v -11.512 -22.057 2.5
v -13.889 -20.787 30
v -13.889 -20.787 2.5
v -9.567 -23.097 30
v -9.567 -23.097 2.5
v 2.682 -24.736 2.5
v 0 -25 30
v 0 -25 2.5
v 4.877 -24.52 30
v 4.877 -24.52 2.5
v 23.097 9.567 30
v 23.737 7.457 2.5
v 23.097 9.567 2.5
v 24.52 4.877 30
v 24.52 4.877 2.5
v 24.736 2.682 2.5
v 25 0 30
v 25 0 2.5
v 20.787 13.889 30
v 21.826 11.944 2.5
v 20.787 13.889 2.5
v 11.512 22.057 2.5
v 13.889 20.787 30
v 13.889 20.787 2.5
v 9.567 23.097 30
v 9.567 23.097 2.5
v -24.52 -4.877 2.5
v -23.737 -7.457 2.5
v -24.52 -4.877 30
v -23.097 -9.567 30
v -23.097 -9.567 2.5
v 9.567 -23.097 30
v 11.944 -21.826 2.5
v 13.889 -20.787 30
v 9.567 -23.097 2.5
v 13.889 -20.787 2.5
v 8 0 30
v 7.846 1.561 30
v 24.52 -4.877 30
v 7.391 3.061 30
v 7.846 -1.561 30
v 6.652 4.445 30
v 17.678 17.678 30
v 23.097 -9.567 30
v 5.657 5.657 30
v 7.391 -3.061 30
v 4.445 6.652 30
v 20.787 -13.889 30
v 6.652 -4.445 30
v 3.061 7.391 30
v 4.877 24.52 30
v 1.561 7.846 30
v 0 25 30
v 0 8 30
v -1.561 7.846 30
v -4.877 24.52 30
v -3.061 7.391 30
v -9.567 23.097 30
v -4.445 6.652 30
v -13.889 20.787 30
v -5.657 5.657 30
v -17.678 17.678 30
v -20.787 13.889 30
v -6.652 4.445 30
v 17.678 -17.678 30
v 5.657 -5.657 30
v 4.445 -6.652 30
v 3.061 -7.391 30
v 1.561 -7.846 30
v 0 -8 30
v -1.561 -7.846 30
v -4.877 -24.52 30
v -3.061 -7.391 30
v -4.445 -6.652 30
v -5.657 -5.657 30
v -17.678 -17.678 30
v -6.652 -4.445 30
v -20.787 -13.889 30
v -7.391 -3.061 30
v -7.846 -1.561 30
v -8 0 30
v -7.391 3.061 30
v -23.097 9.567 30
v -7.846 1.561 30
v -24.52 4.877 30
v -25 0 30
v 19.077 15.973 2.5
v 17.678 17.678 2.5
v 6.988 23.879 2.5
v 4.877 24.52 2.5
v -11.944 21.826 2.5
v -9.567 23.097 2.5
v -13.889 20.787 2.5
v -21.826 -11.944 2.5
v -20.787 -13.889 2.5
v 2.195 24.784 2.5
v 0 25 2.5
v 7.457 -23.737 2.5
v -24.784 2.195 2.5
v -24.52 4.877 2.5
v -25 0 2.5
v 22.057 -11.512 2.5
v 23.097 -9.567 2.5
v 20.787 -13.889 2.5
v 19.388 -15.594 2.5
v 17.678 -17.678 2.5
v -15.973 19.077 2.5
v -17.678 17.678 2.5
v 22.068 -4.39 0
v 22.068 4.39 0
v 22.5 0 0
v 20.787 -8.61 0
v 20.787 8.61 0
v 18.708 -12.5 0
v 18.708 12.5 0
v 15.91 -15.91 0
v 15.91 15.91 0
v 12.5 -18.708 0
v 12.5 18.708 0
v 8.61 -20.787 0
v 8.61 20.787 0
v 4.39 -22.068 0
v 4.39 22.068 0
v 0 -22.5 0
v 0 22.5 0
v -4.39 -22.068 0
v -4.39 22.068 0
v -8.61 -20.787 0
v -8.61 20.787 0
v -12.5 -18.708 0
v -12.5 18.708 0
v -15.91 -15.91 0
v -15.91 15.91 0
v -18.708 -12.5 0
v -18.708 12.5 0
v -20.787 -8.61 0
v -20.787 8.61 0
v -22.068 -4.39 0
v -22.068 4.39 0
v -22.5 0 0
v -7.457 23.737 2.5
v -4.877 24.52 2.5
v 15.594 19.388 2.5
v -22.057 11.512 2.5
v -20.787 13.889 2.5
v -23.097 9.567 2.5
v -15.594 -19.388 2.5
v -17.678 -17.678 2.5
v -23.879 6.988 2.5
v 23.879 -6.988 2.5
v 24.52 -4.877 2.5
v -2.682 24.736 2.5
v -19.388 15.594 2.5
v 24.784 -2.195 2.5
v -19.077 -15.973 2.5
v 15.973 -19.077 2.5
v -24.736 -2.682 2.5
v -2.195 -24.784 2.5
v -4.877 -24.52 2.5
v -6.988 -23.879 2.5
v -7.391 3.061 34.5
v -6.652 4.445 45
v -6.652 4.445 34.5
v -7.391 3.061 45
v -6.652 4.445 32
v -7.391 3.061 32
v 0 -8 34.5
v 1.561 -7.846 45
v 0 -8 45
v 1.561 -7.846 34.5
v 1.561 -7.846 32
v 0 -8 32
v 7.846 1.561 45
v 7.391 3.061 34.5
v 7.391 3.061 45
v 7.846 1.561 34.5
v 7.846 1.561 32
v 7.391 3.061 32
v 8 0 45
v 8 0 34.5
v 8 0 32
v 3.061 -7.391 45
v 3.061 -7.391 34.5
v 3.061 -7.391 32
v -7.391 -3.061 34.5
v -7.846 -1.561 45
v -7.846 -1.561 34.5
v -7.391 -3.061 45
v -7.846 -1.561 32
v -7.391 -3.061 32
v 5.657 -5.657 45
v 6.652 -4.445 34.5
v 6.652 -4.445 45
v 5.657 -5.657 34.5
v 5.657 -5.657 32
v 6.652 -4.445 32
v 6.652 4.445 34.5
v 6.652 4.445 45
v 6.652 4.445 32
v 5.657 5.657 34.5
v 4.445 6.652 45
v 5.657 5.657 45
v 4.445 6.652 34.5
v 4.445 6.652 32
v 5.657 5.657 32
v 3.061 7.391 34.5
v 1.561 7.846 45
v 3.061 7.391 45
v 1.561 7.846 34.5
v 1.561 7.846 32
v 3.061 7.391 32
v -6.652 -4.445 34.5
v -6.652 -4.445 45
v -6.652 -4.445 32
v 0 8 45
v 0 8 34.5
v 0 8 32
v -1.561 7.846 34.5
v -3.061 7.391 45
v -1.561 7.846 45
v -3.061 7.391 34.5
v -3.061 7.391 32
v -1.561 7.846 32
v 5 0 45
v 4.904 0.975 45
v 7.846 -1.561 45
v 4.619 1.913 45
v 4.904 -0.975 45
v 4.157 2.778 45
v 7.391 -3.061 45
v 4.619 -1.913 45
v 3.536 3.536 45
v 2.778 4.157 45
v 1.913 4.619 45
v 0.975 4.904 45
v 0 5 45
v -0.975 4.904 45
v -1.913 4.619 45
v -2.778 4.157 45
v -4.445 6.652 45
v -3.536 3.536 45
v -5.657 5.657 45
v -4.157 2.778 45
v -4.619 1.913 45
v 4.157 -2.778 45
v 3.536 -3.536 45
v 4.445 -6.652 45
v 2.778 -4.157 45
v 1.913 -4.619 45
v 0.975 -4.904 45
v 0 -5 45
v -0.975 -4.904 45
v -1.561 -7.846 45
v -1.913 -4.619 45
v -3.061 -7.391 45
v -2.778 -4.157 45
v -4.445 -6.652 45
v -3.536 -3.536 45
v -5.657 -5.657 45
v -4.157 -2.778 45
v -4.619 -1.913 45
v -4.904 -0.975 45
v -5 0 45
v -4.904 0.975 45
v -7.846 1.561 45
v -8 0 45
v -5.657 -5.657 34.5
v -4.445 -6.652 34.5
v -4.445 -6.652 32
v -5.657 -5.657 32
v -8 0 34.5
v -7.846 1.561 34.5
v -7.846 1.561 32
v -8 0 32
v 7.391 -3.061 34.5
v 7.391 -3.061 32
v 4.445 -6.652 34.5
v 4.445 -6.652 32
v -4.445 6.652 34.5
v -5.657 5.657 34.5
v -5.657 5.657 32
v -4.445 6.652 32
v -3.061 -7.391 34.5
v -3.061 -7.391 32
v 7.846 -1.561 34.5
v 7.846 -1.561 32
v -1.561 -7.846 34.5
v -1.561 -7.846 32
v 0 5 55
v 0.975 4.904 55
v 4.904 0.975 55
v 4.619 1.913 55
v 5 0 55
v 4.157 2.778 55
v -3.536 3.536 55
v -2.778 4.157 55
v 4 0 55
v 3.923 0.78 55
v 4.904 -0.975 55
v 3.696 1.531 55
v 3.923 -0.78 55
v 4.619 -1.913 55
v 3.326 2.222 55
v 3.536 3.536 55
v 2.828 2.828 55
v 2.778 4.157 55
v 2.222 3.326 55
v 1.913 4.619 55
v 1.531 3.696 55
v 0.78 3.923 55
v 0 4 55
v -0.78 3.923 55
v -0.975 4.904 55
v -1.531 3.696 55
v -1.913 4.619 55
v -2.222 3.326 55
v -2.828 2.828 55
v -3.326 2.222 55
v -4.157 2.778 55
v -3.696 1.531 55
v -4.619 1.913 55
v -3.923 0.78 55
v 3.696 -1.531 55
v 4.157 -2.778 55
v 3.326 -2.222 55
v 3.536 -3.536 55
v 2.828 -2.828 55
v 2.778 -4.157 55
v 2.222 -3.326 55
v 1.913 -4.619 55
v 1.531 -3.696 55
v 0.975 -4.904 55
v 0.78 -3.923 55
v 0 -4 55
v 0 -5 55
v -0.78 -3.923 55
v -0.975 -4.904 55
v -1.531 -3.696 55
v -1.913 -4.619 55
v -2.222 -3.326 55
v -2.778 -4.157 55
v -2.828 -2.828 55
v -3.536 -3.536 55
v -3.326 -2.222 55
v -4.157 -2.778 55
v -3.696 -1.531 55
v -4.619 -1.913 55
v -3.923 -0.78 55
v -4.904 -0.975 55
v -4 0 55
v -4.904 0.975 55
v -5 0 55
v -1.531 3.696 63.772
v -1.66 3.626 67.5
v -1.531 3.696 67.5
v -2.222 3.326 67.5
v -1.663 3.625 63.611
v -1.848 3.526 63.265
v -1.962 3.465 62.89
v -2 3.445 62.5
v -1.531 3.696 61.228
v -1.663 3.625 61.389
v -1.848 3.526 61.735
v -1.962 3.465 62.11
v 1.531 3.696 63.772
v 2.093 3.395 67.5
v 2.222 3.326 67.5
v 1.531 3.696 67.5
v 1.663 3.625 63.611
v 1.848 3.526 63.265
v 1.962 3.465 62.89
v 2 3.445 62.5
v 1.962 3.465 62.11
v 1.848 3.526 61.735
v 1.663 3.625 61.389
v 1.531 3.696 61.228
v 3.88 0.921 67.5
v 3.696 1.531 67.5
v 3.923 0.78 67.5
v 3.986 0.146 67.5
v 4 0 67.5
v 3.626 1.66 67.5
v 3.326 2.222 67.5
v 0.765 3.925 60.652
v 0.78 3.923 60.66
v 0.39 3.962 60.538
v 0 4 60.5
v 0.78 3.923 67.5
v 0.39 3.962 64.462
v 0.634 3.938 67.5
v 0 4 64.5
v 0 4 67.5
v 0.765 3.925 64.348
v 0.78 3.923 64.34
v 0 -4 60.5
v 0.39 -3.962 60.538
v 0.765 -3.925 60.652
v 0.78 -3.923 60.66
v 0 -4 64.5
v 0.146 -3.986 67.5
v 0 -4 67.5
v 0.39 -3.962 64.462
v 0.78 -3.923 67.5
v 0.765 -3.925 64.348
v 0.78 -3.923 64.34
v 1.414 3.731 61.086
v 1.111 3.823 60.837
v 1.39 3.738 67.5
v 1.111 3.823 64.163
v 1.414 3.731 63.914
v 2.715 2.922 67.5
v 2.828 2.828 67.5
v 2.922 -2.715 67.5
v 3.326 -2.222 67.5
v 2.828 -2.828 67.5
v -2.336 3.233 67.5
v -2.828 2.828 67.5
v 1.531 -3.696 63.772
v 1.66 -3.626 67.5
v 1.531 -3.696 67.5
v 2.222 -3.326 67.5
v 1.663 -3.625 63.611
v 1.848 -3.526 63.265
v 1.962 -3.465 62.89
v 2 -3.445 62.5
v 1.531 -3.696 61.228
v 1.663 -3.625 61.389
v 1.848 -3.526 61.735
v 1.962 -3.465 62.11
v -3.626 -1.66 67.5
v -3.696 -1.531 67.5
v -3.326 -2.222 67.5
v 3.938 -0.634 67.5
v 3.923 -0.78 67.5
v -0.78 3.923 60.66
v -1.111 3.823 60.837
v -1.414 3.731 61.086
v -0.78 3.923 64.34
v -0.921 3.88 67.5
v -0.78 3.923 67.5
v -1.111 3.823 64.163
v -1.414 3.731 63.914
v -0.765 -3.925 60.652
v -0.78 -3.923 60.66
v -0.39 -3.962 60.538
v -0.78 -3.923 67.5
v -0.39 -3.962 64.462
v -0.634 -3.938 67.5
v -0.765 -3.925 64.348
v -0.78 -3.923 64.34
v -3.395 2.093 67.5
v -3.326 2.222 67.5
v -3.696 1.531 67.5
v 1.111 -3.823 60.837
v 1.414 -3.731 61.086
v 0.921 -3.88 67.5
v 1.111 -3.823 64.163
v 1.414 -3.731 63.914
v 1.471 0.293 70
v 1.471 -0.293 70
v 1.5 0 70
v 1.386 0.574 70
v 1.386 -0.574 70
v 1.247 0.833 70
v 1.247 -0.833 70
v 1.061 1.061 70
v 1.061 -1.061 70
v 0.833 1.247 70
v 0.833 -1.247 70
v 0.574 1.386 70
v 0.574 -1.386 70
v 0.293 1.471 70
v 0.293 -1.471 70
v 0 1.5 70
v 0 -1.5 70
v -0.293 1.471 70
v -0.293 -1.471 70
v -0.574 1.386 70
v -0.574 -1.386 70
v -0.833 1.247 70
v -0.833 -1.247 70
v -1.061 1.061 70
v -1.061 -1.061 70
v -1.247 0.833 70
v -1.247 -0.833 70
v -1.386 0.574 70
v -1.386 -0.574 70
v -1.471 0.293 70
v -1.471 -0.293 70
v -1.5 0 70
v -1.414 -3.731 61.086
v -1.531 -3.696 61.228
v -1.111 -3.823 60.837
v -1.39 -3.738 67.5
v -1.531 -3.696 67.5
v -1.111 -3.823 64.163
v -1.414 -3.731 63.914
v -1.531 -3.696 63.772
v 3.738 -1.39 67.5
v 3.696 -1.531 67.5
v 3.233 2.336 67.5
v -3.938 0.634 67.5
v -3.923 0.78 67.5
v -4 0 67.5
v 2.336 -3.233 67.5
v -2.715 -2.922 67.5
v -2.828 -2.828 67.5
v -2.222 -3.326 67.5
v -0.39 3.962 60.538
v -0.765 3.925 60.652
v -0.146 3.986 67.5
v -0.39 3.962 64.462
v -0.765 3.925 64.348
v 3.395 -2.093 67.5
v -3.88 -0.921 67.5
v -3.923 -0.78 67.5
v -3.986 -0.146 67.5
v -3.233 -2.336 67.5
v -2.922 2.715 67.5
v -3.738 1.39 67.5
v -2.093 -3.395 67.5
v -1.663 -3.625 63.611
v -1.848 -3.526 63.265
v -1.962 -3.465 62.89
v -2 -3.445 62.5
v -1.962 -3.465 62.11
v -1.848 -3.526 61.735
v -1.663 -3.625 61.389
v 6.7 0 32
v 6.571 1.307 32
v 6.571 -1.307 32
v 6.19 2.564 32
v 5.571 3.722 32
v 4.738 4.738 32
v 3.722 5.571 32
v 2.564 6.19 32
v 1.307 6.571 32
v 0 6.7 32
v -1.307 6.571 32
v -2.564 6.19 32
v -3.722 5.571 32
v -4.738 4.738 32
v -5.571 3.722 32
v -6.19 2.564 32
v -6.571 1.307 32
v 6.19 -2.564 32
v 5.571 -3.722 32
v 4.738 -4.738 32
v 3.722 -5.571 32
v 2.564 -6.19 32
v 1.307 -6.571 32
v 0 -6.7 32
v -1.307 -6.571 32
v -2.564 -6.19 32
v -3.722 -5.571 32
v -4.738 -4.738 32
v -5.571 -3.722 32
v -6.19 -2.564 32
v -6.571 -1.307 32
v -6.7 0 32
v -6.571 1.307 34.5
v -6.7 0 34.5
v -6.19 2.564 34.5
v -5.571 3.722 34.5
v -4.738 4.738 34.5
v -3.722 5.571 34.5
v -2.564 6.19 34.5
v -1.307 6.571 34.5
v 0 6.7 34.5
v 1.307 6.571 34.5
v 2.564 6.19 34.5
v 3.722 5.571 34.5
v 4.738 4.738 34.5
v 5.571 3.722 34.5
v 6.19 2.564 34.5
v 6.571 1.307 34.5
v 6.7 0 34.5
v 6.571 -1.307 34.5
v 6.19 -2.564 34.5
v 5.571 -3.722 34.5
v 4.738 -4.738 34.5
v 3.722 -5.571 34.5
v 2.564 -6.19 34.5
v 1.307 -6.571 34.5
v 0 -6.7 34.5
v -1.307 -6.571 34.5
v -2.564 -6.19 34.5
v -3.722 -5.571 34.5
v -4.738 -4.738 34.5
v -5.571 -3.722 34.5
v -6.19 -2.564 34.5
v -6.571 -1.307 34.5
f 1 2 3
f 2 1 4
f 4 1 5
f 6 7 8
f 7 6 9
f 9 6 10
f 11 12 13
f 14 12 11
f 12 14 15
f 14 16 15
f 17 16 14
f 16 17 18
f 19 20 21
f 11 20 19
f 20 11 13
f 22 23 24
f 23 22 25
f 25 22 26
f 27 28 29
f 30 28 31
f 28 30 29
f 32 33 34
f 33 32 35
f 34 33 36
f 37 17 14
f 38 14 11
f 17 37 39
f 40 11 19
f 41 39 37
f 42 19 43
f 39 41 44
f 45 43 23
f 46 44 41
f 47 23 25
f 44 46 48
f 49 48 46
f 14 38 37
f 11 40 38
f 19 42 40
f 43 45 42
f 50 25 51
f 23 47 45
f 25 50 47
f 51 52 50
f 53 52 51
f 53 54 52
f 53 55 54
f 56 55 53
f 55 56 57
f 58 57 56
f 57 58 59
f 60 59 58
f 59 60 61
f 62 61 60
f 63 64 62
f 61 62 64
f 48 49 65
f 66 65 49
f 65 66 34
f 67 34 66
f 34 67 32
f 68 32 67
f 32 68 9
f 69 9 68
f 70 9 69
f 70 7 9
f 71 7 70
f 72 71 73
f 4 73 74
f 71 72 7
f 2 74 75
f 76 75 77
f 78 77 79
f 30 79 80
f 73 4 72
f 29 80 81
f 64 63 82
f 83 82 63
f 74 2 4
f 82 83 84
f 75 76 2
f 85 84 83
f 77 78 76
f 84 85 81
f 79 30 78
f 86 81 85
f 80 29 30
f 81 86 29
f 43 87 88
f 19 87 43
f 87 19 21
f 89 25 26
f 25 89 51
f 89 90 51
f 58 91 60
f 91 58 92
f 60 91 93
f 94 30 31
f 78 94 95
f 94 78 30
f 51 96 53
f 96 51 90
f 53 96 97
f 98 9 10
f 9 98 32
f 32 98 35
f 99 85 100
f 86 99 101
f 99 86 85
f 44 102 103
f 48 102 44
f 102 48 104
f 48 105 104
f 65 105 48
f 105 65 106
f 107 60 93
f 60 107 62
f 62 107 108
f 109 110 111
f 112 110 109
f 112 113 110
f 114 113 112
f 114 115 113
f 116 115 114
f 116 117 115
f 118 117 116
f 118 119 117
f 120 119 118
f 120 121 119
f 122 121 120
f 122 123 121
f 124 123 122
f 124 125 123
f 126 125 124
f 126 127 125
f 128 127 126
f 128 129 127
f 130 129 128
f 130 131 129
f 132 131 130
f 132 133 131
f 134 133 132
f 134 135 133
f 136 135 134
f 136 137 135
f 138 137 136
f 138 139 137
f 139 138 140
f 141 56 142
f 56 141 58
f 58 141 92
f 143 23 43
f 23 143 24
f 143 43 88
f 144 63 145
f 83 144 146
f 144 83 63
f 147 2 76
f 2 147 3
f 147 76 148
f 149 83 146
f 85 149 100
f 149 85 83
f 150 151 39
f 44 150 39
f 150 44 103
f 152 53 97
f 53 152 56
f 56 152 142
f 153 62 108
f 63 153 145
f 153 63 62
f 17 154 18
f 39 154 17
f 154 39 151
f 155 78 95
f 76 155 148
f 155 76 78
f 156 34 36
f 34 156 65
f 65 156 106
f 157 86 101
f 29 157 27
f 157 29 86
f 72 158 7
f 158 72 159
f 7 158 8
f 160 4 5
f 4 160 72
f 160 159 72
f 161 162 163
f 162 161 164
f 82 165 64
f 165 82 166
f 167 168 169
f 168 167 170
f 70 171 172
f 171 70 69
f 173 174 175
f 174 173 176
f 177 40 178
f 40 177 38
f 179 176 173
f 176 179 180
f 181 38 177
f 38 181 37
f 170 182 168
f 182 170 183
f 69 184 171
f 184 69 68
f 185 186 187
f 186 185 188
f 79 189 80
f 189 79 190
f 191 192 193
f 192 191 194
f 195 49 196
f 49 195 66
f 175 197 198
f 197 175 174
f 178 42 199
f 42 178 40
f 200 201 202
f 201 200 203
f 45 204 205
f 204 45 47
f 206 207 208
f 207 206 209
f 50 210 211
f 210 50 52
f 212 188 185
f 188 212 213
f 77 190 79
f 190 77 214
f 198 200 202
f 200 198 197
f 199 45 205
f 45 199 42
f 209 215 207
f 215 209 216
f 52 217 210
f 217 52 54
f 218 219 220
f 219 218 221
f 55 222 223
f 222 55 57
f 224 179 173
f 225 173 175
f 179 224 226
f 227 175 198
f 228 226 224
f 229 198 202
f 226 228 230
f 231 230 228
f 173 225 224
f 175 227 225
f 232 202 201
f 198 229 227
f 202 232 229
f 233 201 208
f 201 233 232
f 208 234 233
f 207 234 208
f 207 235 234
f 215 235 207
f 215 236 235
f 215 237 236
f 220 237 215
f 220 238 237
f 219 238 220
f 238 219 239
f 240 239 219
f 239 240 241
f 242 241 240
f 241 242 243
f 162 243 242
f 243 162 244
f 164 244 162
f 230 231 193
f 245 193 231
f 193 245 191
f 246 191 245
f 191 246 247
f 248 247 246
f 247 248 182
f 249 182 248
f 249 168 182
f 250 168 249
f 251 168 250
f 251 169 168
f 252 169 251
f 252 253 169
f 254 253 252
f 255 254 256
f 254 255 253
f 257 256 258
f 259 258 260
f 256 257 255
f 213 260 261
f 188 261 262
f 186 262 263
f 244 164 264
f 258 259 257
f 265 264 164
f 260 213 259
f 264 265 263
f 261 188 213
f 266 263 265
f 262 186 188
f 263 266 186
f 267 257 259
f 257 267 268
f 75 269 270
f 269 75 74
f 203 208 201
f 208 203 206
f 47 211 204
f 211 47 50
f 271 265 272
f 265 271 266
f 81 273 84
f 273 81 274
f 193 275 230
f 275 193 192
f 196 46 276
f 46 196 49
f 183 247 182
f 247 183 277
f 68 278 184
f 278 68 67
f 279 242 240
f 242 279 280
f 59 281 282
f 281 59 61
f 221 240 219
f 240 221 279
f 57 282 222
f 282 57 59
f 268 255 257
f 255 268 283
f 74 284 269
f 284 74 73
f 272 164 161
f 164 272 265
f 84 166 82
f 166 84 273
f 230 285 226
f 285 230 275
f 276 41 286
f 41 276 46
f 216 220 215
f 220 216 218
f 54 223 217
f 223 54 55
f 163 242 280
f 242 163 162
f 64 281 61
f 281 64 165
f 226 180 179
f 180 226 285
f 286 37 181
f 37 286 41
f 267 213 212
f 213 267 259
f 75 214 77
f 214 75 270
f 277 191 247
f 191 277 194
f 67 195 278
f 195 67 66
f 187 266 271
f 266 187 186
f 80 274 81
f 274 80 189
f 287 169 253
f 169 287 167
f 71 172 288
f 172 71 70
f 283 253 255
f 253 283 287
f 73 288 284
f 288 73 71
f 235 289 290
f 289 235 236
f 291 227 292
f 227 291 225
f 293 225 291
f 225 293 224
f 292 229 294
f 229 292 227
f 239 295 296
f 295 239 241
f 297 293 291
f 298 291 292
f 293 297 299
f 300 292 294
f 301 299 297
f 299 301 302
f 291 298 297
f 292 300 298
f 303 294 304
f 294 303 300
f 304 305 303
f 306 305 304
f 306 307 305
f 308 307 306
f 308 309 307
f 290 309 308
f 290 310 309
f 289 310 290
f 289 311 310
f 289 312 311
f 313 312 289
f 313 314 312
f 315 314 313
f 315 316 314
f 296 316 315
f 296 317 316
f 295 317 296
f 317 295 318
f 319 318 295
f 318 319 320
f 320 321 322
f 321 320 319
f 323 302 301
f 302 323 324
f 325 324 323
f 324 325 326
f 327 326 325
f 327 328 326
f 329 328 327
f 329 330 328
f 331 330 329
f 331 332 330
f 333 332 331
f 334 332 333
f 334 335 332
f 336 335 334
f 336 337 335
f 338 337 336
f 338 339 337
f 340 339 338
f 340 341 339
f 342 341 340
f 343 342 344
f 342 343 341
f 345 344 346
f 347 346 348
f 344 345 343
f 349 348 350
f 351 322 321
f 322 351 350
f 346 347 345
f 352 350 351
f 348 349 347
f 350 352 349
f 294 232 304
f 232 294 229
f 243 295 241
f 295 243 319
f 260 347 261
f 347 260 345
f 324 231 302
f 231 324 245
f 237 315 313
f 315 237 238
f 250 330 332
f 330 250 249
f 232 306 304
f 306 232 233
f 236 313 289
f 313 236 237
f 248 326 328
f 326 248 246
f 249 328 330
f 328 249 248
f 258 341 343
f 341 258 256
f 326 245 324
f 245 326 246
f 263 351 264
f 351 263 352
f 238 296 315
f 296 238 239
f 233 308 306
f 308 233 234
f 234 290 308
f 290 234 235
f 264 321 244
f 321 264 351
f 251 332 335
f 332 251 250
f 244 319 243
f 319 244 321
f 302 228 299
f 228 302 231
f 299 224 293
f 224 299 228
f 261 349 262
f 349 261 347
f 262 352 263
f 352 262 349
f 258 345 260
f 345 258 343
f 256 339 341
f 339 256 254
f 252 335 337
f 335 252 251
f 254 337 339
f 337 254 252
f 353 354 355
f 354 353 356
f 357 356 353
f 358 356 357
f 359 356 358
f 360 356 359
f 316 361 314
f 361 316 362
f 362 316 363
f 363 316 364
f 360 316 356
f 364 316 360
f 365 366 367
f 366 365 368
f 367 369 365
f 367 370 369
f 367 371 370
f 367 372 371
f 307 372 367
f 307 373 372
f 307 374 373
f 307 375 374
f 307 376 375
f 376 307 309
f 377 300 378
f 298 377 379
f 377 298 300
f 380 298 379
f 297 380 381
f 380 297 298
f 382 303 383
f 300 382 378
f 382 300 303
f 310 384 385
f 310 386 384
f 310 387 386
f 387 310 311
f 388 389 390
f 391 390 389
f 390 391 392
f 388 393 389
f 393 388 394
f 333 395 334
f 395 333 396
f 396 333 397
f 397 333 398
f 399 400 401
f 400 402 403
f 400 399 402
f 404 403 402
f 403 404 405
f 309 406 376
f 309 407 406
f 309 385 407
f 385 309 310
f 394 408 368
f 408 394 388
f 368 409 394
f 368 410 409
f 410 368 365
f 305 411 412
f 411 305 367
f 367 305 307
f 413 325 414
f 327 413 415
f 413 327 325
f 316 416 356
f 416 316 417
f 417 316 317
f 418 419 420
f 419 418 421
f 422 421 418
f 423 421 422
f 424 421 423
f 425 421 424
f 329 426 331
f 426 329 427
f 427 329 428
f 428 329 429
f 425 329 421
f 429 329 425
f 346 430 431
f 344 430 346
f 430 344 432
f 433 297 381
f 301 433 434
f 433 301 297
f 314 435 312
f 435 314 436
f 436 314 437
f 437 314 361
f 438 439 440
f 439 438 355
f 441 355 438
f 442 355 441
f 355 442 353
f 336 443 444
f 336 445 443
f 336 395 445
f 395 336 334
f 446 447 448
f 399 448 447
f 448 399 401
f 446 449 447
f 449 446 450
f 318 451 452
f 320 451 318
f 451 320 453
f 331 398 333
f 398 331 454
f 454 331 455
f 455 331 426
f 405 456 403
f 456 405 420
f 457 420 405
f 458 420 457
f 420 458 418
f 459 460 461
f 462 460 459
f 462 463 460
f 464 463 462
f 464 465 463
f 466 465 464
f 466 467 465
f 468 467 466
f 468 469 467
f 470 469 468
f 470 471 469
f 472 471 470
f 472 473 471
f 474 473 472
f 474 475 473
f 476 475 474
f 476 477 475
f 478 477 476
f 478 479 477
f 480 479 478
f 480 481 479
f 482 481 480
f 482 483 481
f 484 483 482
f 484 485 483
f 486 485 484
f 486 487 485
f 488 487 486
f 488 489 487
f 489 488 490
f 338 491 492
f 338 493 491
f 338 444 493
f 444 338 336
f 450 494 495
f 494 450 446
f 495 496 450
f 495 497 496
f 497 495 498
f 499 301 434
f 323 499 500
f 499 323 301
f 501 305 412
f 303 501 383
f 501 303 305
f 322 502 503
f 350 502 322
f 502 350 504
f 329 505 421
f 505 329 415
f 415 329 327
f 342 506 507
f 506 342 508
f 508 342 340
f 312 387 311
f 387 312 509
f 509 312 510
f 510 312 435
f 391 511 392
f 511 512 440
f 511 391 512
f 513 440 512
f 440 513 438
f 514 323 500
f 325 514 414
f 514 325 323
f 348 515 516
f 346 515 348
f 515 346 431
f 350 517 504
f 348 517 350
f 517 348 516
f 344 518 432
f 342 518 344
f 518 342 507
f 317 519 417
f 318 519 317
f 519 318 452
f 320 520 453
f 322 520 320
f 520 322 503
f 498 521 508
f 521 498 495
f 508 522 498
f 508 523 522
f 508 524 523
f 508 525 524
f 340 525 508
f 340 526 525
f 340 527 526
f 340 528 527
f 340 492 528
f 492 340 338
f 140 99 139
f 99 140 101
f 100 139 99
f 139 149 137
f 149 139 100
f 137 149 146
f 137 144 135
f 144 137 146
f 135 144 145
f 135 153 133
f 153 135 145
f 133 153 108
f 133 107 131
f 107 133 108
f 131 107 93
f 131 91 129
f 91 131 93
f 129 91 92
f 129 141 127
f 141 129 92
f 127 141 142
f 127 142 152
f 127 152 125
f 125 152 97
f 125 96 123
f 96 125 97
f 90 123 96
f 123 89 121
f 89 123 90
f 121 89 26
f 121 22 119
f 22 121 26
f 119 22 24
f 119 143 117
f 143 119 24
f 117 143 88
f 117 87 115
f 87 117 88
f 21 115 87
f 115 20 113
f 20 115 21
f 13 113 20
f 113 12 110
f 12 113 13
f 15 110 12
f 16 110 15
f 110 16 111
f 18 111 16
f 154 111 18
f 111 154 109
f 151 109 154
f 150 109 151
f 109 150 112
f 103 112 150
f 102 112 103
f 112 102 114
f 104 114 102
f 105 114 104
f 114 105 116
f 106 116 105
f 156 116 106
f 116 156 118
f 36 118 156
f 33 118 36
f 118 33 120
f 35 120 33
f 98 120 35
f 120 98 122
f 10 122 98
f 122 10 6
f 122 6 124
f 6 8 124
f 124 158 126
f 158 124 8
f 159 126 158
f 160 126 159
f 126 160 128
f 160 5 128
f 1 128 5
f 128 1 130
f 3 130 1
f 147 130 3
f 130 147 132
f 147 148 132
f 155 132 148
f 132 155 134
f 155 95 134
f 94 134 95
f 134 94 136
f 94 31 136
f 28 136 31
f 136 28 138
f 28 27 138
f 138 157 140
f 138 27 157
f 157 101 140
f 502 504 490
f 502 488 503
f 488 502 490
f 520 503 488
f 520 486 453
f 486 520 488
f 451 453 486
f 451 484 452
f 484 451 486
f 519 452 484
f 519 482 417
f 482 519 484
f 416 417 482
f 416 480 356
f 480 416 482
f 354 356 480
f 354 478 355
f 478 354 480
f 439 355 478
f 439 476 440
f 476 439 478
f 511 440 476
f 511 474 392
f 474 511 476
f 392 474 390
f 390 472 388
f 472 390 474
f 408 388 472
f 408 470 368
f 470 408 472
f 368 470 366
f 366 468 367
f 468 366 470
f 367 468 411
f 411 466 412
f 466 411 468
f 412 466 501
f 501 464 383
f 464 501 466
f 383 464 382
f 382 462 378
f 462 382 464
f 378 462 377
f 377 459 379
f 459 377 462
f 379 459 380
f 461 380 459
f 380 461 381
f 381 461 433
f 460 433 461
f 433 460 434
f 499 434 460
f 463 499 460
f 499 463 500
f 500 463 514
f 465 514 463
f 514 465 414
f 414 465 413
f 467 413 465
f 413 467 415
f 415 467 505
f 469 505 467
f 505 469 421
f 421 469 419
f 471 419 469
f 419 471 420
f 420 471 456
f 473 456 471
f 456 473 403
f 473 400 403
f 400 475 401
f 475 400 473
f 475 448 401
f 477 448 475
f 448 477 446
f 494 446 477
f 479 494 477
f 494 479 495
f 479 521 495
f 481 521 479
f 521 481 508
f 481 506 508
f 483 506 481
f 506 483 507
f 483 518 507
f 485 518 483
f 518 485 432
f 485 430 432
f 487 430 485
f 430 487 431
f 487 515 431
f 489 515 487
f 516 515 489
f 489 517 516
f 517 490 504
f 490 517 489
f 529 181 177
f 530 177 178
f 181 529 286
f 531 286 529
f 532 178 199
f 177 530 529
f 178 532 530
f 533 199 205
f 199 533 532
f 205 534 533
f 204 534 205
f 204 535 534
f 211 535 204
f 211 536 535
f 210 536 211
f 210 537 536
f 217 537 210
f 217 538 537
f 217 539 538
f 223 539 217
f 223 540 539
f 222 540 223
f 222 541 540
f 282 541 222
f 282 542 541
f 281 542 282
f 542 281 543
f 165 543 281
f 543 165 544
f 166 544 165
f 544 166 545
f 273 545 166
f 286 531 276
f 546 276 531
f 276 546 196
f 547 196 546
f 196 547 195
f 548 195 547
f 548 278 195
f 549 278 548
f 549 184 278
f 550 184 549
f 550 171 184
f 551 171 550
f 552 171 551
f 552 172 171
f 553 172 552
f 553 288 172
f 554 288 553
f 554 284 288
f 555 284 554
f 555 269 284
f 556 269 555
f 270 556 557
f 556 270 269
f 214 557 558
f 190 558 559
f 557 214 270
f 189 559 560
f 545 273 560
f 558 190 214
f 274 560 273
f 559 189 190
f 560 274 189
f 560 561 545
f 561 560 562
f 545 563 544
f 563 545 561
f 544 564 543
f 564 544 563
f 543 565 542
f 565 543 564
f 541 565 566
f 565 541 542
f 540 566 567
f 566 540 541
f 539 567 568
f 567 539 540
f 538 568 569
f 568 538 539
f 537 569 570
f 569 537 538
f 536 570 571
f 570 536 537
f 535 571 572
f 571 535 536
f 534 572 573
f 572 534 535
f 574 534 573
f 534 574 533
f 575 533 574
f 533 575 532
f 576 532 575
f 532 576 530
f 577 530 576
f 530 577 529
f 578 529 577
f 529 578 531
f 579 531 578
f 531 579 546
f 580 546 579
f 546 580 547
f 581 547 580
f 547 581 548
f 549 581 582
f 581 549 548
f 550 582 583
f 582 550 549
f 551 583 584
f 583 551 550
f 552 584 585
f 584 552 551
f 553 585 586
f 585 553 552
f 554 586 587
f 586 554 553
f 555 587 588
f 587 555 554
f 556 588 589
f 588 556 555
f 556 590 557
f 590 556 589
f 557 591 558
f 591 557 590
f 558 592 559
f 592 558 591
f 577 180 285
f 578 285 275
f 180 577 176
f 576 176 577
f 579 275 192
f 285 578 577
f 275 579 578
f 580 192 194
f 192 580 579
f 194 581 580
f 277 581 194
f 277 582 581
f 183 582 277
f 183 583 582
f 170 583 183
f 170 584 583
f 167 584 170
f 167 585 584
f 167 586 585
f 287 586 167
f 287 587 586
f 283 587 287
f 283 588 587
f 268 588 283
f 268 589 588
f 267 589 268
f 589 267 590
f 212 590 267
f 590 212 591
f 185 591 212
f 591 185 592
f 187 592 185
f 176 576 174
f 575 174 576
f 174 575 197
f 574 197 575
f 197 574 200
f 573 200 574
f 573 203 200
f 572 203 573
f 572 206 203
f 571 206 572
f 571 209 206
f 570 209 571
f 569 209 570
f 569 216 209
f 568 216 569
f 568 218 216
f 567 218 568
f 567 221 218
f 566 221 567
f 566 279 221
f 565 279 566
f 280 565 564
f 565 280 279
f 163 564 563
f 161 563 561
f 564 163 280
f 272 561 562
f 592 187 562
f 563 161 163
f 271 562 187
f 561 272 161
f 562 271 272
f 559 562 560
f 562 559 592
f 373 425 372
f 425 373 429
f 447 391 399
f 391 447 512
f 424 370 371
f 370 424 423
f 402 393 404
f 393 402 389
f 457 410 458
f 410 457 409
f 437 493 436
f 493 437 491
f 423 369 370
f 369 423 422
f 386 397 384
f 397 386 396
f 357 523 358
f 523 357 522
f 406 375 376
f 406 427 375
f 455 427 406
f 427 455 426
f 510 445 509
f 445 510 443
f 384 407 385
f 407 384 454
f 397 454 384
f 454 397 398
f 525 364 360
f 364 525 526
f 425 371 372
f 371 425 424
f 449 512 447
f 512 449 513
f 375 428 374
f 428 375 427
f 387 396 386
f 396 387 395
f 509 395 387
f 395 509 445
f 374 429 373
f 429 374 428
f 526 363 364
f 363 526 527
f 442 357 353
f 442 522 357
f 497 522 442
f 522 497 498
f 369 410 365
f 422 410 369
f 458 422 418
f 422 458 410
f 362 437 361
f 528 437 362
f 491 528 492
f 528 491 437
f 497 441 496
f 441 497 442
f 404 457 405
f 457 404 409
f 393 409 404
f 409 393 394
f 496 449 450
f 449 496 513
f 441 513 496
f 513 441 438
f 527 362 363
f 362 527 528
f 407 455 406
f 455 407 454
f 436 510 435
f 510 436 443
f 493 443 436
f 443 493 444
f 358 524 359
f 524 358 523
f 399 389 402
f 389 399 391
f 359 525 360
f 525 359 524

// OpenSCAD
$fn = 32;

// ----------------------------------------------------------------------
// Stepped shaft: diameters 50, 16, 10, 8 mm, 70 mm long
// ----------------------------------------------------------------------

// --- parameters (mm) ---
d1 = 50;                  // step 1 diameter
len1 = 30;                // step 1 length
d2 = 16;                  // step 2 diameter
len2 = 15;                // step 2 length
d3 = 10;                  // step 3 diameter
len3 = 10;                // step 3 length
d4 = 8;                   // step 4 diameter
len4 = 15;                // step 4 length
total = 70;               // overall length
chamfer = 2.5;            // end chamfer
groove_r = 8;             // groove radius
groove_z = 32;            // groove position from the end
groove_w = 2.5;           // groove width
groove_d = 1.3;           // groove depth
cross_d = 4;              // cross pin hole
cross_z = 62.5;           // cross hole position

difference() {
  /* turned body: stacked cylinders, every step sunk into the bigger one */
  union() {
    cylinder(h = len1, d = d1);
    translate([0, 0, 29.6]) cylinder(h = 15.4, d = d2);
    translate([0, 0, 44.6]) cylinder(h = 10.4, d = d3);
    translate([0, 0, 54.6]) cylinder(h = 15.4, d = d4);
  }
  /* bottom chamfer ring cut */
  rotate_extrude() translate([22.5, -2.5]) polygon([[0, 0], [5, 0], [5, 7.5], [0, 2.5]]);
  /* top chamfer ring cut */
  rotate_extrude() translate([1.5, 70]) polygon([[0, 0], [5, -5], [5, 2.5], [0, 2.5]]);
  /* circlip groove just behind the shoulder */
  rotate_extrude() translate([groove_r - groove_d, groove_z]) square([groove_d + 2.5, groove_w]);
  /* cross pin hole through the small step */
  translate([0, 0, cross_z]) rotate([90, 0, 0]) cylinder(h = d4 + 5, d = cross_d, center = true);
}
